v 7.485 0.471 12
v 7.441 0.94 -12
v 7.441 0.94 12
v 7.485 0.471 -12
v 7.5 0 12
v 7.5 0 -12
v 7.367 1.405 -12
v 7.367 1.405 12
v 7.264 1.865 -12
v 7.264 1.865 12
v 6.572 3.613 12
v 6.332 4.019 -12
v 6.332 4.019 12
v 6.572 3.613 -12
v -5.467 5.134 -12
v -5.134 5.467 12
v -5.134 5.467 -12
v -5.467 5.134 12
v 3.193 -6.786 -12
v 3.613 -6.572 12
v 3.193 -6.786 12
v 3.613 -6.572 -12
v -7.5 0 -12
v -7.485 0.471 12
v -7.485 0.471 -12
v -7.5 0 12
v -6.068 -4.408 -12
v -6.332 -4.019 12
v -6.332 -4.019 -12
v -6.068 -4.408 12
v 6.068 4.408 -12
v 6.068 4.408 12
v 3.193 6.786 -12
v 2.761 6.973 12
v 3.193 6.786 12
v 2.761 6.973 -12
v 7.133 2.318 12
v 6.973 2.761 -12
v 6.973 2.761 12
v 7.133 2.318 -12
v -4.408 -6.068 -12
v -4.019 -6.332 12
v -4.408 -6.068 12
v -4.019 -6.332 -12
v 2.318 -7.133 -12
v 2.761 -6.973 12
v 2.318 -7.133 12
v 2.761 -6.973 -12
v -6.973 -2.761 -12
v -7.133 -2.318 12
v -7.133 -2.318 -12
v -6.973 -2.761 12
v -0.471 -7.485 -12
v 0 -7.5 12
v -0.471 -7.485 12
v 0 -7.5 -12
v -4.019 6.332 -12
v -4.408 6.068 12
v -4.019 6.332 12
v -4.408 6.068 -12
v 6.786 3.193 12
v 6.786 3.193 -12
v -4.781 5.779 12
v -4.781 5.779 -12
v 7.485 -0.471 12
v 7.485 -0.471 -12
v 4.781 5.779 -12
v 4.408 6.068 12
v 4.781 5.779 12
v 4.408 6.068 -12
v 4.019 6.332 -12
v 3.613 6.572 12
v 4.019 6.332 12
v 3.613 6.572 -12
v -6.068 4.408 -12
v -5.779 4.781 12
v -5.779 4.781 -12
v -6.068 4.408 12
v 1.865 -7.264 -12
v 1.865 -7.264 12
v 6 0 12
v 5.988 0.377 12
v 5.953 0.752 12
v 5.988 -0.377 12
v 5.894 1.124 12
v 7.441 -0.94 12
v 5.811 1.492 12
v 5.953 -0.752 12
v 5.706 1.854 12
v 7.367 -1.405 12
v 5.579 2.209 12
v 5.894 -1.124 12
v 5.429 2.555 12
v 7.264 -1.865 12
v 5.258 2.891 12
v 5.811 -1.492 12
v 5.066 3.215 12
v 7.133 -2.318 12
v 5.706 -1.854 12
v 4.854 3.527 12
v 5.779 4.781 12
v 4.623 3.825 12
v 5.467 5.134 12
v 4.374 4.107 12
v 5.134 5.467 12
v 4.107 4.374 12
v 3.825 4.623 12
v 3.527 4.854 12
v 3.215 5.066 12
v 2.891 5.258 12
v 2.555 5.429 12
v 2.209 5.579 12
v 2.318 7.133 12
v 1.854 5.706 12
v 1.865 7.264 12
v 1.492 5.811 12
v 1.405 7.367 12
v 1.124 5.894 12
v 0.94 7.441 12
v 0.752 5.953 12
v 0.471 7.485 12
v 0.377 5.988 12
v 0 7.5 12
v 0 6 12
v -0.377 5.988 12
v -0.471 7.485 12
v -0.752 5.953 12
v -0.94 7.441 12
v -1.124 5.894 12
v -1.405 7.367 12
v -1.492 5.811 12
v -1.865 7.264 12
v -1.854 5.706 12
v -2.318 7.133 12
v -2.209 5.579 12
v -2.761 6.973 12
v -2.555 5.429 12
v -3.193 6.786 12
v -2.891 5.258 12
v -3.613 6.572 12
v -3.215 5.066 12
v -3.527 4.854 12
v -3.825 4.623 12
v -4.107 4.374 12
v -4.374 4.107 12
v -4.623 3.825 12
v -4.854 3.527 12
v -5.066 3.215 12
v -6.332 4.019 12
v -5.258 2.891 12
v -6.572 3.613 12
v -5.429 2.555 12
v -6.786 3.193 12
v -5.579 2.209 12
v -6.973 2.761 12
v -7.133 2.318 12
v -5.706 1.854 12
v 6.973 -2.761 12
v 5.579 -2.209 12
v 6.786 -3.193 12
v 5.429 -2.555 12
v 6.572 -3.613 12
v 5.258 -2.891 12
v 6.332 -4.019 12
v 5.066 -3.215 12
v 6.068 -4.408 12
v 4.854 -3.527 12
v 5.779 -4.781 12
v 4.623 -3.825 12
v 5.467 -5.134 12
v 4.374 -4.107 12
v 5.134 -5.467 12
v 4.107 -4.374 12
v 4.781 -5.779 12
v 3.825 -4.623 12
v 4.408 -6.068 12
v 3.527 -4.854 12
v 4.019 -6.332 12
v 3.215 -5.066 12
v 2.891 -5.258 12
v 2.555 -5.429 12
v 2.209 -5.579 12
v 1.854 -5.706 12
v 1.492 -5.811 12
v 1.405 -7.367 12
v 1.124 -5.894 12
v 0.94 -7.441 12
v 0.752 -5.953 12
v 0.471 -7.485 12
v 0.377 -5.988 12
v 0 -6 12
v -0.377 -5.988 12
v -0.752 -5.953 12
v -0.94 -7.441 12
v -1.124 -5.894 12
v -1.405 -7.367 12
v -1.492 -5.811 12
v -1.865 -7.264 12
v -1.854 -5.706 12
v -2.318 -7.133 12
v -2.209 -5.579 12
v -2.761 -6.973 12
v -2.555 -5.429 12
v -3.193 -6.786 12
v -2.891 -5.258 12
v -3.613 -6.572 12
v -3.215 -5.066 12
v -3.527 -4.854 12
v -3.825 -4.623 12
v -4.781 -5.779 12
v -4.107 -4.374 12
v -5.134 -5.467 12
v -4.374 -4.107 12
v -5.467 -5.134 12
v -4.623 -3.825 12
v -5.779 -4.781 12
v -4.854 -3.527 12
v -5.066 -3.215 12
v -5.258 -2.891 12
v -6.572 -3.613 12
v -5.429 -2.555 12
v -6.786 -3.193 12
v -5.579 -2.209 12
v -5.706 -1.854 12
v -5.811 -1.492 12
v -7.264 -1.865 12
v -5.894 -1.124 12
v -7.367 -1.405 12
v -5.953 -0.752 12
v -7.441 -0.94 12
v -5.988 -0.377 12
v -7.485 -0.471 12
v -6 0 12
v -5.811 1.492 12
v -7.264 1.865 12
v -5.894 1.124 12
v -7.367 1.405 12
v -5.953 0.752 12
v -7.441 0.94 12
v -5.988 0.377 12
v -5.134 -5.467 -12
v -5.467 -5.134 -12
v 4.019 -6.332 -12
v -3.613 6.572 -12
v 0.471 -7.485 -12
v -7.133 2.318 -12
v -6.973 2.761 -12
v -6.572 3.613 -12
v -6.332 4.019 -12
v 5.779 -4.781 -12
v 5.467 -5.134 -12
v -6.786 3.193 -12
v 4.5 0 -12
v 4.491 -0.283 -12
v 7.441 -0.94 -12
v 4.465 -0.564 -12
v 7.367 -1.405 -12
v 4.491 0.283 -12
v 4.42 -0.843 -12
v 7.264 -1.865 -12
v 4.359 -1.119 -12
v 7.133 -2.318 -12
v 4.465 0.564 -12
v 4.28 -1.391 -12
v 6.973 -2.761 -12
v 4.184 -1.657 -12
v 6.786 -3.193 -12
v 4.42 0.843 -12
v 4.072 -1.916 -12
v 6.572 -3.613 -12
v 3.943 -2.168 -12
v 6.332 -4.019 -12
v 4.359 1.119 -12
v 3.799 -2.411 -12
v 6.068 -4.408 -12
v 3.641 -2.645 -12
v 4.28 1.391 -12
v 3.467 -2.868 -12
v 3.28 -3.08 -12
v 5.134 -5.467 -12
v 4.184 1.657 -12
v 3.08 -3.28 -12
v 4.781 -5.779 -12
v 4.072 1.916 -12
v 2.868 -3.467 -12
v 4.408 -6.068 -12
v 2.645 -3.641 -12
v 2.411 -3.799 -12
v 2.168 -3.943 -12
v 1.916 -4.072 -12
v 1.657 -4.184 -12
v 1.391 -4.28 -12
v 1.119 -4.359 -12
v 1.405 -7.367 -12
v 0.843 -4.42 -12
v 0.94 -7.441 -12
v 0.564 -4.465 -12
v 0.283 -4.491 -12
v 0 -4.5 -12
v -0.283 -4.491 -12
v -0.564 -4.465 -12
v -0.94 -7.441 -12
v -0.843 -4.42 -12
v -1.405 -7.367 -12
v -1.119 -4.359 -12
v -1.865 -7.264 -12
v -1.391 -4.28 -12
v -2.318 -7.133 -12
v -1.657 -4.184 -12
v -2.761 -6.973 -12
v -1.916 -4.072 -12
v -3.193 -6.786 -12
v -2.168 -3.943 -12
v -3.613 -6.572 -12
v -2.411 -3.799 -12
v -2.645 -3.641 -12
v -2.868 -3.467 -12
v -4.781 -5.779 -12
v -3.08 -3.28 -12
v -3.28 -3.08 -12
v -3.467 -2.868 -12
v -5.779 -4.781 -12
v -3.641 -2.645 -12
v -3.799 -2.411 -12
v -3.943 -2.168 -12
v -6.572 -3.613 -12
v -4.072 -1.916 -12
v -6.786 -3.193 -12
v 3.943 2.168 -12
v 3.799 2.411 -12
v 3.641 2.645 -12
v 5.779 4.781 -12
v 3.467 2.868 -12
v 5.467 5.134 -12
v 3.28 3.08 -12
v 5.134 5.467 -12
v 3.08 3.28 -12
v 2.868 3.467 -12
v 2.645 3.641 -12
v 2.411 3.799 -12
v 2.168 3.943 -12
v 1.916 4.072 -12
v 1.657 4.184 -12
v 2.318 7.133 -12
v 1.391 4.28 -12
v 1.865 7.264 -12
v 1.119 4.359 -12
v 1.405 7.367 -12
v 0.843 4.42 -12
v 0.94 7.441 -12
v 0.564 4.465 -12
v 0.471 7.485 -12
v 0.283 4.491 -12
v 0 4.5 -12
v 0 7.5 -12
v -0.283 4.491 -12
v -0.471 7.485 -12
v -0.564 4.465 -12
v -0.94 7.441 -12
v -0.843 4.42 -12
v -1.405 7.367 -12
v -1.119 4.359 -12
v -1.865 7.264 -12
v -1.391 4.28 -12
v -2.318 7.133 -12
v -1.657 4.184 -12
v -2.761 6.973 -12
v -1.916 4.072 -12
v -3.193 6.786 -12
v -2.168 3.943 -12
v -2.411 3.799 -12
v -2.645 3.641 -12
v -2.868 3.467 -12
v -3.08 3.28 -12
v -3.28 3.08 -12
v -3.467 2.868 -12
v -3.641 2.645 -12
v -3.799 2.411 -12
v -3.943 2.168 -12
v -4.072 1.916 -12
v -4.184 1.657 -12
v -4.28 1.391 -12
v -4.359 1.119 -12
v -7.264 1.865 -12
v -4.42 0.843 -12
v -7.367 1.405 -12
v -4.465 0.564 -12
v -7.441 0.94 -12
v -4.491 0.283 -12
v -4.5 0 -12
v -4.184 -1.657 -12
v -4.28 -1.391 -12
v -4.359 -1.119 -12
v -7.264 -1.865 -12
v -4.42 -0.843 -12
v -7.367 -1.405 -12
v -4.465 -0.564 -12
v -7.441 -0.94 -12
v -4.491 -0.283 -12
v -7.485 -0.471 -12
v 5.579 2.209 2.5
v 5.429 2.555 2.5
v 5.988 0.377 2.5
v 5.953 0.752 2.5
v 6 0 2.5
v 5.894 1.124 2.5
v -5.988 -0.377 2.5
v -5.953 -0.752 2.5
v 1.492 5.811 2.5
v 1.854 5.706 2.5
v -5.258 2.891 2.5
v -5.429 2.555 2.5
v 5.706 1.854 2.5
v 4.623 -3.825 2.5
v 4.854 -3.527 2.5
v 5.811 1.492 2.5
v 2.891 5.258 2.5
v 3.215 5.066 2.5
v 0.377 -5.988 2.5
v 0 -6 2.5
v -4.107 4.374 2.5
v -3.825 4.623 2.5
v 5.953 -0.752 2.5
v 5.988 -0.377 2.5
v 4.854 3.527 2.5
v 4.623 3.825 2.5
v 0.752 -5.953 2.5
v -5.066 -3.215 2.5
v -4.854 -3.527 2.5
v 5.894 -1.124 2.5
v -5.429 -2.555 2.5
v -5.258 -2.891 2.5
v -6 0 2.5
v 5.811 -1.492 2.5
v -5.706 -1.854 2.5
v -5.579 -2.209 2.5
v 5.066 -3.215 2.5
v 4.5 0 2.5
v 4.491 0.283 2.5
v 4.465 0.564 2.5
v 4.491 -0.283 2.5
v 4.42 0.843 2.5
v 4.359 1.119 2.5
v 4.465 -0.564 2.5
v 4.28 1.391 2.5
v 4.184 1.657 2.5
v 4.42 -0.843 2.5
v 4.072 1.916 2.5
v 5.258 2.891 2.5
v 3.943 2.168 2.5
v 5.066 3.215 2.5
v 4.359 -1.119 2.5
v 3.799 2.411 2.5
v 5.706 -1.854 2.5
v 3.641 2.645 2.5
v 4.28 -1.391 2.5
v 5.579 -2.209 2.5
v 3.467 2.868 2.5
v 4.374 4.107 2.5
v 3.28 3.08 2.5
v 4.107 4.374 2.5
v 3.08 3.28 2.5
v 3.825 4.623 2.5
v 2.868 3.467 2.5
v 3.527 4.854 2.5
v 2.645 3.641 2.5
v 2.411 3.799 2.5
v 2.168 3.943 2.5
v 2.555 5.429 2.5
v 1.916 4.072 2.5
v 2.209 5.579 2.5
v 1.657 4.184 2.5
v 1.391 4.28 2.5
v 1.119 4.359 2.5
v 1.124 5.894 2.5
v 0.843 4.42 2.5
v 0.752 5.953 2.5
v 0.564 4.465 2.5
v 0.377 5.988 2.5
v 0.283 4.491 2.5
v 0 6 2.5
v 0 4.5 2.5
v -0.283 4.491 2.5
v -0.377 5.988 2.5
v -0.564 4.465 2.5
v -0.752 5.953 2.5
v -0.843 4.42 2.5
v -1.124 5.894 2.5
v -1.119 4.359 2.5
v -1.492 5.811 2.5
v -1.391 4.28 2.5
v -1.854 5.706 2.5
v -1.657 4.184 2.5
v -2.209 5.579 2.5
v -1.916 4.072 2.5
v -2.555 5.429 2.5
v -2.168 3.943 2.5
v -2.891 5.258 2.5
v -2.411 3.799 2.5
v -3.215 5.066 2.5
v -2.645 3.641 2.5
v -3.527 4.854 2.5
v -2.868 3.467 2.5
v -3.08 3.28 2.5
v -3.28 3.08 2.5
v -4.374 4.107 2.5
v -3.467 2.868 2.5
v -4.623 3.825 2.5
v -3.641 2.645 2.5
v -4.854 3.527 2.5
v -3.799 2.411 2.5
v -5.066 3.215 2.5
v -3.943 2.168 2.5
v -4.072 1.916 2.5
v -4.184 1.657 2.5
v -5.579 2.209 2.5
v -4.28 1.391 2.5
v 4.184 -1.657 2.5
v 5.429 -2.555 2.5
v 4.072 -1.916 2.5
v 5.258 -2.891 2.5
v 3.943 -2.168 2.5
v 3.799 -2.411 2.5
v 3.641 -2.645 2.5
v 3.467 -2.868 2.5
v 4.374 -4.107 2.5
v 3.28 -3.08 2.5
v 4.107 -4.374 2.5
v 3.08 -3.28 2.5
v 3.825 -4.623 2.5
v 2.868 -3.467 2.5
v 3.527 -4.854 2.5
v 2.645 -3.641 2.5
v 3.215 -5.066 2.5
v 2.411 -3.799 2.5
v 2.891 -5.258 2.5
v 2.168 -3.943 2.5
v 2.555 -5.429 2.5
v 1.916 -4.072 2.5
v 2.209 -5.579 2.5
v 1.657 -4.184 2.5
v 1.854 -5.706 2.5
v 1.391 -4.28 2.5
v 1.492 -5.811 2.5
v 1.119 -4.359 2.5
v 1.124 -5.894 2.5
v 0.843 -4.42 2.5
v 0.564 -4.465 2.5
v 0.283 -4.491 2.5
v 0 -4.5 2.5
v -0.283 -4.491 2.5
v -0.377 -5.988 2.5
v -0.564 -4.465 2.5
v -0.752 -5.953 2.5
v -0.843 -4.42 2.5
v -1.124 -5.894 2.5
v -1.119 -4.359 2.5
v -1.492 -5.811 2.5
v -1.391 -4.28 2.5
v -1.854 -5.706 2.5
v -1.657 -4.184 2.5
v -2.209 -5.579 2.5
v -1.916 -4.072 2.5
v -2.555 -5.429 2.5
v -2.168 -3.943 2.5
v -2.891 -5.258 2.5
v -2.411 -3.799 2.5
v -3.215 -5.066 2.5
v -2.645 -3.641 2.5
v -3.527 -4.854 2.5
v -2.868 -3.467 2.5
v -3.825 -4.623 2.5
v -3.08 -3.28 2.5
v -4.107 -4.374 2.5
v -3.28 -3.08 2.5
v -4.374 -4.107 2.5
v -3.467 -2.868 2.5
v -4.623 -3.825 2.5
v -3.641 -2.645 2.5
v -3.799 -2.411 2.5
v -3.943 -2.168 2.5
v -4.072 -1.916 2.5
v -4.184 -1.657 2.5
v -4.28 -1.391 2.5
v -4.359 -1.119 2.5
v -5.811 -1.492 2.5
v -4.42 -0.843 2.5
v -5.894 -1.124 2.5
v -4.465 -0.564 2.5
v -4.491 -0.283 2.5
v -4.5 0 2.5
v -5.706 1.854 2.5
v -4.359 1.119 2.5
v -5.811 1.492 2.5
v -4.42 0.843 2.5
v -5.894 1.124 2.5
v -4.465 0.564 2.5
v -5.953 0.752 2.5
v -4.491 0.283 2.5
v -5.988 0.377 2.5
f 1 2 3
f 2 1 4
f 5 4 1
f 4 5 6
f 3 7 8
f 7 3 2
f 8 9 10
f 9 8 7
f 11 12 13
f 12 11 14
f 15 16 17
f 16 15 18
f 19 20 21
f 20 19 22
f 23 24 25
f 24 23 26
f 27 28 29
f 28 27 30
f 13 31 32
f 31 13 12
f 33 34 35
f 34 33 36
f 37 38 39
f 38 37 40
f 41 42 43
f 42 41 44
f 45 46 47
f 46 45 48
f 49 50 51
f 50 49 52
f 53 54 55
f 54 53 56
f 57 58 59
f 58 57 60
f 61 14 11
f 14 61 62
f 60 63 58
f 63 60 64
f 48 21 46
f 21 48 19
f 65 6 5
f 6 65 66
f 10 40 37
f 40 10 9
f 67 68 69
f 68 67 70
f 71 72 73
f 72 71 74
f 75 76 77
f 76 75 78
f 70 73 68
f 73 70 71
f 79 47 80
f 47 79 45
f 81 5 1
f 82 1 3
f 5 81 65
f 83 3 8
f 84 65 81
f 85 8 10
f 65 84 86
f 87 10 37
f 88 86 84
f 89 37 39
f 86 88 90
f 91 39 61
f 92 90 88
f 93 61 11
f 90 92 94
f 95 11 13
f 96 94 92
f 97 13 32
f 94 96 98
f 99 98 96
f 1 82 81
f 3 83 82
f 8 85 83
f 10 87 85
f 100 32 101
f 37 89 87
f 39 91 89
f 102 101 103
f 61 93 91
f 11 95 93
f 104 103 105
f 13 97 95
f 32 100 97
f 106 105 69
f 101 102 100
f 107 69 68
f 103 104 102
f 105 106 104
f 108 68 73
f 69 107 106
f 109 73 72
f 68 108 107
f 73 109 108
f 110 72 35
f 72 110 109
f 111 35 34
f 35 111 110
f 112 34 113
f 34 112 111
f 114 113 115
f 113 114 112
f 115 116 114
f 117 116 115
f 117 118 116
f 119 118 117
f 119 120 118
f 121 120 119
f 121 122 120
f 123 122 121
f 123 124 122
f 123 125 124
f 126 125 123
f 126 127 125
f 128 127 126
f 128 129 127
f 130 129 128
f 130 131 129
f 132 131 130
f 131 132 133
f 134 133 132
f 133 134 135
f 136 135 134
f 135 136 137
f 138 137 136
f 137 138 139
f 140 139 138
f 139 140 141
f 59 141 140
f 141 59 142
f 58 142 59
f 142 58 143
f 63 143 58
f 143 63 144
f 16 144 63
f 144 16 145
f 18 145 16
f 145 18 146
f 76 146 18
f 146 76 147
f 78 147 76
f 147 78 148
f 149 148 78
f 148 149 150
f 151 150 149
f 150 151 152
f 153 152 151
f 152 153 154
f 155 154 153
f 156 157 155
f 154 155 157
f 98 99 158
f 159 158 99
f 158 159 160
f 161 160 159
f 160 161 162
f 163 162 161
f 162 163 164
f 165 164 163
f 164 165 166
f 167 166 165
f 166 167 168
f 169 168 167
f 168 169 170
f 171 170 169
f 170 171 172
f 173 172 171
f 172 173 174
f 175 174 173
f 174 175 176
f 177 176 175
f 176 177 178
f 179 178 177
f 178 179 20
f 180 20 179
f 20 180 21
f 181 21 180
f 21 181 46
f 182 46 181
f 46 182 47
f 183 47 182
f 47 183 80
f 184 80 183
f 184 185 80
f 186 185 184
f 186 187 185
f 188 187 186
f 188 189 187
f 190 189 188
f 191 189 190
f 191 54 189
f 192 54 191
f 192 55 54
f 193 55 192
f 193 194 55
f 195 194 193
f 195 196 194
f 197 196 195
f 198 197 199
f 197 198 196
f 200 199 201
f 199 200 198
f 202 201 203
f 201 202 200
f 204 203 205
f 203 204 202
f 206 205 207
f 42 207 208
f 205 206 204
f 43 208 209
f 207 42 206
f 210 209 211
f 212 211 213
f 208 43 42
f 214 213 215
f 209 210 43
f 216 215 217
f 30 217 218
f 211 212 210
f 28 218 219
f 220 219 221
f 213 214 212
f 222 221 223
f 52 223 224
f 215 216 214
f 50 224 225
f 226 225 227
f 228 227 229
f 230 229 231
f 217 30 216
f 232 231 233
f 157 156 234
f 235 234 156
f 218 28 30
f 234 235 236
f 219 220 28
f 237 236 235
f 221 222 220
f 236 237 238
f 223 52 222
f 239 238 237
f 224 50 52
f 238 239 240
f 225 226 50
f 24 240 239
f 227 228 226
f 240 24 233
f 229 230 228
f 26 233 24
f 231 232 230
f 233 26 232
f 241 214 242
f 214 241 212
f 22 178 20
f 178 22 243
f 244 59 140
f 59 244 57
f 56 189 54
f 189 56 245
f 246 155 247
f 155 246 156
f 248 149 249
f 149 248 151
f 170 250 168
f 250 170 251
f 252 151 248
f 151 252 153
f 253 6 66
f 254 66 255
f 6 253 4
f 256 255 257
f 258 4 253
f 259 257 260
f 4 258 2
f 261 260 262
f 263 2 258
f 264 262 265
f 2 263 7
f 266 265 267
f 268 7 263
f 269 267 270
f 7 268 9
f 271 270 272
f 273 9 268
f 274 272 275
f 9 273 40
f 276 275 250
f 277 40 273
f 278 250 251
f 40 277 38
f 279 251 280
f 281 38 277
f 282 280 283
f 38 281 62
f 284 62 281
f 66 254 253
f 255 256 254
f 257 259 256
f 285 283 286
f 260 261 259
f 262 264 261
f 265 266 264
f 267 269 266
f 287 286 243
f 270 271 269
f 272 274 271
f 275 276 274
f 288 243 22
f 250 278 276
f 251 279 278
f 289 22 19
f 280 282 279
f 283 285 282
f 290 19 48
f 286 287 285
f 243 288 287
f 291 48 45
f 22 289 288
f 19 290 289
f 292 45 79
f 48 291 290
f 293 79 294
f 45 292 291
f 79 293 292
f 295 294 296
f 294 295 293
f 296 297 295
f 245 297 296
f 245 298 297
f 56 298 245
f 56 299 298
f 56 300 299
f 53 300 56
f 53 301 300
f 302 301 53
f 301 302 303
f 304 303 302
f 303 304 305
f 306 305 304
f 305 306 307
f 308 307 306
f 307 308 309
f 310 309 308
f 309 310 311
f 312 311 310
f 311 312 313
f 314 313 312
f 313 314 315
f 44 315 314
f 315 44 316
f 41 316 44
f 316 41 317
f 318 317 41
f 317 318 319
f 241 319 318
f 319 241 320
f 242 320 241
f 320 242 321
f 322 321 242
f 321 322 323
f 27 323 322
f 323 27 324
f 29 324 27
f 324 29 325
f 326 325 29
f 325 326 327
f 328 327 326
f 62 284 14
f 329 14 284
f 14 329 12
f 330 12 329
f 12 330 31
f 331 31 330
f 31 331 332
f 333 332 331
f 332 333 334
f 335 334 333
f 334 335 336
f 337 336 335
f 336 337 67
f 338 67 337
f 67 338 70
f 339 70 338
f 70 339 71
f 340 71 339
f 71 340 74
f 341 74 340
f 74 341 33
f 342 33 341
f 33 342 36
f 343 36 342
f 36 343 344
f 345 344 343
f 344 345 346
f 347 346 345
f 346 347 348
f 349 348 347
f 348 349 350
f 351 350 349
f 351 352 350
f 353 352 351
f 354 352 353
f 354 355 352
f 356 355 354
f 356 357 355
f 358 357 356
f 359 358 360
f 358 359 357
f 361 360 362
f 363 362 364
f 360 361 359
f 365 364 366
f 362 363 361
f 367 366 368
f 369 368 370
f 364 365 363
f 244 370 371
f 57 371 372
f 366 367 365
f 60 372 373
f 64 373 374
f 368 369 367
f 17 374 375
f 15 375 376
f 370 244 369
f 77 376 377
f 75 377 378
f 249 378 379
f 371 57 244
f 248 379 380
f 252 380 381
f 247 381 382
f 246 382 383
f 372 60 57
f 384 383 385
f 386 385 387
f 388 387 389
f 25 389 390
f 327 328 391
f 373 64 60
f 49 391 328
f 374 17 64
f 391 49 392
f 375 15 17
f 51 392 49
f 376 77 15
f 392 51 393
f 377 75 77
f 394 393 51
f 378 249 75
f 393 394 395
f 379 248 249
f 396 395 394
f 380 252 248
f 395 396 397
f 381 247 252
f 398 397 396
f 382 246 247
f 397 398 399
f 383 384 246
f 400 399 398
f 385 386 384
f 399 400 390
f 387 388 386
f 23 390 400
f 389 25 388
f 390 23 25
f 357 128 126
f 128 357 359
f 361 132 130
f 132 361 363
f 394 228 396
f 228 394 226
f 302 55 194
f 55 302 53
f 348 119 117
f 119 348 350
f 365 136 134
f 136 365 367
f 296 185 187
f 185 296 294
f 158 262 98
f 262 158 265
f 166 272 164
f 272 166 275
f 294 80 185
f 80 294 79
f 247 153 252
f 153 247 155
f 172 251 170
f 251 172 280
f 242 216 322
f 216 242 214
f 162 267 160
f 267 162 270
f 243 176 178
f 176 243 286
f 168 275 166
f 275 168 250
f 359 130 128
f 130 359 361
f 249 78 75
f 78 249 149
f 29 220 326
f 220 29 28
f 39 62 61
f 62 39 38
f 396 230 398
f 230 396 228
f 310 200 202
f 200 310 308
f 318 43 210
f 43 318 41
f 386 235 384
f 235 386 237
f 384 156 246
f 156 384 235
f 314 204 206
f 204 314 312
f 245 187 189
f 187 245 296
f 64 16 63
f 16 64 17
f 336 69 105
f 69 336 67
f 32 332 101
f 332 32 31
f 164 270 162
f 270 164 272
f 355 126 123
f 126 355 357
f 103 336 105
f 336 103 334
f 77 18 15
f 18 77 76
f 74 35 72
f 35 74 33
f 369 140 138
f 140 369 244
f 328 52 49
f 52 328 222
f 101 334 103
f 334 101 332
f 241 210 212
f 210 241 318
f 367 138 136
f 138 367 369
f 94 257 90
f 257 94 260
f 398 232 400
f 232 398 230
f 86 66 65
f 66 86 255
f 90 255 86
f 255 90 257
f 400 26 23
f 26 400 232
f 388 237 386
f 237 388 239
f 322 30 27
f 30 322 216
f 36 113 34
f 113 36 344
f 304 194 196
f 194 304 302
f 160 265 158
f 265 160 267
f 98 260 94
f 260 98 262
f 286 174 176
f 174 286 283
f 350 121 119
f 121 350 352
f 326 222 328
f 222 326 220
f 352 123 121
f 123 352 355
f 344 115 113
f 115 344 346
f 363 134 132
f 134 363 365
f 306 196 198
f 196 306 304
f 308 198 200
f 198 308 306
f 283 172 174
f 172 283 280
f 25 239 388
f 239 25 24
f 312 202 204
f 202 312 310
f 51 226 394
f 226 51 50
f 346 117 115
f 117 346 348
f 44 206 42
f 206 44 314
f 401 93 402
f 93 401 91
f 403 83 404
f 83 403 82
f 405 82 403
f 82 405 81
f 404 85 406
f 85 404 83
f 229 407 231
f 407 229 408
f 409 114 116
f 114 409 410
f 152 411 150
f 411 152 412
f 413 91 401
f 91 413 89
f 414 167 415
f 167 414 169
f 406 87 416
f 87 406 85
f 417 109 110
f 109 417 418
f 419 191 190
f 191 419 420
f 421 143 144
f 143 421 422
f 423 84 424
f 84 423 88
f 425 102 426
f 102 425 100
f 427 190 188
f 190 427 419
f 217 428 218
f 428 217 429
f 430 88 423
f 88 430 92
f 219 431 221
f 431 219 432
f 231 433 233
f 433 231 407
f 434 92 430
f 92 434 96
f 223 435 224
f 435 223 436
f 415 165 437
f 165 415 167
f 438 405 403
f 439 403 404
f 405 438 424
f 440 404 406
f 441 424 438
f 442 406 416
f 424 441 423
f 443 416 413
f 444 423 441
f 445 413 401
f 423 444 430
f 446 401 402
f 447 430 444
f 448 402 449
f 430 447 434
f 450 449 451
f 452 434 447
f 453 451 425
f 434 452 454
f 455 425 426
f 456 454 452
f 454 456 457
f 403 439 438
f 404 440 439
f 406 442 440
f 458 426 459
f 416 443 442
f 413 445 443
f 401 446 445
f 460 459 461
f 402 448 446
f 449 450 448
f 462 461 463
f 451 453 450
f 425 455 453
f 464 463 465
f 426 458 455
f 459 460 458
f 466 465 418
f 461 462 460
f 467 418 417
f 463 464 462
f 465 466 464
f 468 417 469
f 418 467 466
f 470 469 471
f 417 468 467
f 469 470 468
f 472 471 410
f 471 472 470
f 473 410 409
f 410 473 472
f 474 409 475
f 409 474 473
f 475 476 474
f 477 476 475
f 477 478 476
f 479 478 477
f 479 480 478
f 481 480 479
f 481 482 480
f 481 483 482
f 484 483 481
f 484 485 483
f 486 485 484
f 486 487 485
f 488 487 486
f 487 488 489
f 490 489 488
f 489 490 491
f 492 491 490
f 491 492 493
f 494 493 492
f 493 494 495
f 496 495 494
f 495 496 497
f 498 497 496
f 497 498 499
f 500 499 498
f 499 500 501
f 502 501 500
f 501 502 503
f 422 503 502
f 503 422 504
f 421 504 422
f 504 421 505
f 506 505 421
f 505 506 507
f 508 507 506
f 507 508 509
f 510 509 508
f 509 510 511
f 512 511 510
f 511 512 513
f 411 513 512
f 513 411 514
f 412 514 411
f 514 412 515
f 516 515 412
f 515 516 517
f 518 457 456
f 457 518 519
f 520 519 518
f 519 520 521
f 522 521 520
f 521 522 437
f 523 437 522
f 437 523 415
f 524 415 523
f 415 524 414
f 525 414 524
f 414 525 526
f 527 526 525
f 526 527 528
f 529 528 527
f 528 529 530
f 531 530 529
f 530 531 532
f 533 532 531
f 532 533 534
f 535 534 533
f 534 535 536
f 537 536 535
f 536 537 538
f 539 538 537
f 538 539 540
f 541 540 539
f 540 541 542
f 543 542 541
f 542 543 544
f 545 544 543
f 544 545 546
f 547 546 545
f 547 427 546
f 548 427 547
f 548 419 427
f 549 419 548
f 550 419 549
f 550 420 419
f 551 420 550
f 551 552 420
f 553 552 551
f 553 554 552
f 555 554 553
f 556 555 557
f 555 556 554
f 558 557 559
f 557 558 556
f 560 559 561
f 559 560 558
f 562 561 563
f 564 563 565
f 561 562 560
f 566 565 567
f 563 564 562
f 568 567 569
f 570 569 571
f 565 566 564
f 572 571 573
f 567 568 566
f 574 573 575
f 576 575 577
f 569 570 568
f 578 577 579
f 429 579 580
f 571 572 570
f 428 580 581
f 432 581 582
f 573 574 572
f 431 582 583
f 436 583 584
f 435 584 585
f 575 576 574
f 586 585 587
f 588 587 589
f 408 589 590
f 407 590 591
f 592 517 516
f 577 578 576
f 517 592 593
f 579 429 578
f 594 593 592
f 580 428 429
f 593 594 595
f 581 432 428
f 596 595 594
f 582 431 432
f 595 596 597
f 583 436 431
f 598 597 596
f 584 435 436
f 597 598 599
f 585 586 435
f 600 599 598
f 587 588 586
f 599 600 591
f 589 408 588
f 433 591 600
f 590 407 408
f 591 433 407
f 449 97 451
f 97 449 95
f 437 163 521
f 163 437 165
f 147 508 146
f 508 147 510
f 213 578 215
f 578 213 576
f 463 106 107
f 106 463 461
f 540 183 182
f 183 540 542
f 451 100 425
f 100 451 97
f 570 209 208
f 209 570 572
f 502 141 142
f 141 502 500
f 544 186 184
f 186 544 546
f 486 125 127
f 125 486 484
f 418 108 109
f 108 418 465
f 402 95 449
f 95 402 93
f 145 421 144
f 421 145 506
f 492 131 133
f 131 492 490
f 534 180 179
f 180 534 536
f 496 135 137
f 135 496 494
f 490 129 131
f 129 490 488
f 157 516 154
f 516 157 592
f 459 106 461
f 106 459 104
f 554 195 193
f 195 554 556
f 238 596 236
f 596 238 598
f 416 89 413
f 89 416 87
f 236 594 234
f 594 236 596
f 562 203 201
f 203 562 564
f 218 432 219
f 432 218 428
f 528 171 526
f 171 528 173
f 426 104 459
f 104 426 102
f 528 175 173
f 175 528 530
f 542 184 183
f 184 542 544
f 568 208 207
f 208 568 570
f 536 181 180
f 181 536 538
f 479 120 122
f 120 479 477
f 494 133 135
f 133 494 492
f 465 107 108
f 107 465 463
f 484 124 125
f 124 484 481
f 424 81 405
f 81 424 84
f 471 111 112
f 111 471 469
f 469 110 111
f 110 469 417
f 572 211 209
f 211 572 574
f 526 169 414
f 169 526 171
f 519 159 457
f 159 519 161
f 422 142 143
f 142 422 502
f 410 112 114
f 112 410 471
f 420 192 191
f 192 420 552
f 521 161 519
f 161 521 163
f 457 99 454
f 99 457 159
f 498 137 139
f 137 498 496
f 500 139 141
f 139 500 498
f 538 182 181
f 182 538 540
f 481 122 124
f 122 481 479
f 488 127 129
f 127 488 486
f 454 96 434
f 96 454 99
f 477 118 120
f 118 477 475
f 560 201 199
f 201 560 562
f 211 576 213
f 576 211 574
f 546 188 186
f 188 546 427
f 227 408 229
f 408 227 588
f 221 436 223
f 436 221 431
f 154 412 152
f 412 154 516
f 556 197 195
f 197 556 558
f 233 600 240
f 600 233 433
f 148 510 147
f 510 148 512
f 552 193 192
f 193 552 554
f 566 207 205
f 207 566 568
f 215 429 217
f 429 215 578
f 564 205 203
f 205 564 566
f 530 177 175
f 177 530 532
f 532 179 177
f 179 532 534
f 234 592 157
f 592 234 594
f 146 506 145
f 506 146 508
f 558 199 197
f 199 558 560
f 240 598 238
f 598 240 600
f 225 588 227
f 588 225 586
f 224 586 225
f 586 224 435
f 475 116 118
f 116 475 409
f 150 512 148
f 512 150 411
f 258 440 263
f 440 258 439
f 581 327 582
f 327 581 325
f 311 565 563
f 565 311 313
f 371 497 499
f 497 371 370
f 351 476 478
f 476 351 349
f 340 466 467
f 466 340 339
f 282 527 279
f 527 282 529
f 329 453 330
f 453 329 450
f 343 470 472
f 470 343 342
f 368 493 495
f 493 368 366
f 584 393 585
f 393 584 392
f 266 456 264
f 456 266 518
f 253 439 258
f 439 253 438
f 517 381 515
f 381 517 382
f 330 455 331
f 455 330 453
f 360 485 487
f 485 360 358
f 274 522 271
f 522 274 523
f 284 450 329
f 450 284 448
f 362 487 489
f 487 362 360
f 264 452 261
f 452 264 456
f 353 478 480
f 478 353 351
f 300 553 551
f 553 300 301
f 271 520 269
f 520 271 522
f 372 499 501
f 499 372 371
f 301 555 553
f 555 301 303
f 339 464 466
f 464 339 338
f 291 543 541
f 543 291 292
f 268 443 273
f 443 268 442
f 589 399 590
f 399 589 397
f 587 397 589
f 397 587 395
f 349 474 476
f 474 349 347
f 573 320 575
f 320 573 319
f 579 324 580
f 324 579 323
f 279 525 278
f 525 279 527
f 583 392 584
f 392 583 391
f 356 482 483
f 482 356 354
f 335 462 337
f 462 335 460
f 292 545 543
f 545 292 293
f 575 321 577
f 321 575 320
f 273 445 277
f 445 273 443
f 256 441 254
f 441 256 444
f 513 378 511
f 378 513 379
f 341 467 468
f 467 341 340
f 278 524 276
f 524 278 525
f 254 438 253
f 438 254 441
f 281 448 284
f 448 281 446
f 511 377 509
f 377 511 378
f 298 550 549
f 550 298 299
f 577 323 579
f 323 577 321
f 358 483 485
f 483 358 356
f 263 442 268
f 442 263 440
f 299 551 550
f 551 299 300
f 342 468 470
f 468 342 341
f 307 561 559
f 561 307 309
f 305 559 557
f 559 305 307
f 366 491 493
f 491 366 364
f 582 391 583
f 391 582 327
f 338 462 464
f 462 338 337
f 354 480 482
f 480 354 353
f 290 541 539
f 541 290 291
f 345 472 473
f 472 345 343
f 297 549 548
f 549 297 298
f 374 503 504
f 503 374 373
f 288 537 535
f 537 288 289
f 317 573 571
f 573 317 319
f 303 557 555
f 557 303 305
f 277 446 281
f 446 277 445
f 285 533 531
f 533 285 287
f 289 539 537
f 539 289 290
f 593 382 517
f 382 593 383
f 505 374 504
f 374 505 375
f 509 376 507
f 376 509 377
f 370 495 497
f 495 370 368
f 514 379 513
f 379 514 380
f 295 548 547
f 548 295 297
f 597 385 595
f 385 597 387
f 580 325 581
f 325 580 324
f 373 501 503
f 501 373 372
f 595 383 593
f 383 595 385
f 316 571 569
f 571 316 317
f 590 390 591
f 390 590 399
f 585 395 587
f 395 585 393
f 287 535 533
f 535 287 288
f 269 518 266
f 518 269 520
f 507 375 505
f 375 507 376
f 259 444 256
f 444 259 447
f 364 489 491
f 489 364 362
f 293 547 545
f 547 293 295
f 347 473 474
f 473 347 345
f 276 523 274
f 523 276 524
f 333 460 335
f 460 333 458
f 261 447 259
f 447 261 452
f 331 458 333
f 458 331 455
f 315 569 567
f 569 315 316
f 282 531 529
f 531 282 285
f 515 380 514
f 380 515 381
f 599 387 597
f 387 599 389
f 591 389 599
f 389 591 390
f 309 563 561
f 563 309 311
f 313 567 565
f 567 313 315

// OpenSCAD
$fn=100;
bushing_diameter = 12/2;
bushing_length = 9.5;

bearing_length = 24;
bearing_diameter = 7.5;
rod_diameter =4.5;

difference()
{
	difference()
	{
		cylinder(r=bearing_diameter ,h=bearing_length,center=true);
		translate([0,0,( bearing_length/2)- bushing_length/2] ) cylinder(r=bushing_diameter, h=bushing_length,center=true);

	}
	cylinder(r=rod_diameter, h=bearing_length +1,center=true);
}
